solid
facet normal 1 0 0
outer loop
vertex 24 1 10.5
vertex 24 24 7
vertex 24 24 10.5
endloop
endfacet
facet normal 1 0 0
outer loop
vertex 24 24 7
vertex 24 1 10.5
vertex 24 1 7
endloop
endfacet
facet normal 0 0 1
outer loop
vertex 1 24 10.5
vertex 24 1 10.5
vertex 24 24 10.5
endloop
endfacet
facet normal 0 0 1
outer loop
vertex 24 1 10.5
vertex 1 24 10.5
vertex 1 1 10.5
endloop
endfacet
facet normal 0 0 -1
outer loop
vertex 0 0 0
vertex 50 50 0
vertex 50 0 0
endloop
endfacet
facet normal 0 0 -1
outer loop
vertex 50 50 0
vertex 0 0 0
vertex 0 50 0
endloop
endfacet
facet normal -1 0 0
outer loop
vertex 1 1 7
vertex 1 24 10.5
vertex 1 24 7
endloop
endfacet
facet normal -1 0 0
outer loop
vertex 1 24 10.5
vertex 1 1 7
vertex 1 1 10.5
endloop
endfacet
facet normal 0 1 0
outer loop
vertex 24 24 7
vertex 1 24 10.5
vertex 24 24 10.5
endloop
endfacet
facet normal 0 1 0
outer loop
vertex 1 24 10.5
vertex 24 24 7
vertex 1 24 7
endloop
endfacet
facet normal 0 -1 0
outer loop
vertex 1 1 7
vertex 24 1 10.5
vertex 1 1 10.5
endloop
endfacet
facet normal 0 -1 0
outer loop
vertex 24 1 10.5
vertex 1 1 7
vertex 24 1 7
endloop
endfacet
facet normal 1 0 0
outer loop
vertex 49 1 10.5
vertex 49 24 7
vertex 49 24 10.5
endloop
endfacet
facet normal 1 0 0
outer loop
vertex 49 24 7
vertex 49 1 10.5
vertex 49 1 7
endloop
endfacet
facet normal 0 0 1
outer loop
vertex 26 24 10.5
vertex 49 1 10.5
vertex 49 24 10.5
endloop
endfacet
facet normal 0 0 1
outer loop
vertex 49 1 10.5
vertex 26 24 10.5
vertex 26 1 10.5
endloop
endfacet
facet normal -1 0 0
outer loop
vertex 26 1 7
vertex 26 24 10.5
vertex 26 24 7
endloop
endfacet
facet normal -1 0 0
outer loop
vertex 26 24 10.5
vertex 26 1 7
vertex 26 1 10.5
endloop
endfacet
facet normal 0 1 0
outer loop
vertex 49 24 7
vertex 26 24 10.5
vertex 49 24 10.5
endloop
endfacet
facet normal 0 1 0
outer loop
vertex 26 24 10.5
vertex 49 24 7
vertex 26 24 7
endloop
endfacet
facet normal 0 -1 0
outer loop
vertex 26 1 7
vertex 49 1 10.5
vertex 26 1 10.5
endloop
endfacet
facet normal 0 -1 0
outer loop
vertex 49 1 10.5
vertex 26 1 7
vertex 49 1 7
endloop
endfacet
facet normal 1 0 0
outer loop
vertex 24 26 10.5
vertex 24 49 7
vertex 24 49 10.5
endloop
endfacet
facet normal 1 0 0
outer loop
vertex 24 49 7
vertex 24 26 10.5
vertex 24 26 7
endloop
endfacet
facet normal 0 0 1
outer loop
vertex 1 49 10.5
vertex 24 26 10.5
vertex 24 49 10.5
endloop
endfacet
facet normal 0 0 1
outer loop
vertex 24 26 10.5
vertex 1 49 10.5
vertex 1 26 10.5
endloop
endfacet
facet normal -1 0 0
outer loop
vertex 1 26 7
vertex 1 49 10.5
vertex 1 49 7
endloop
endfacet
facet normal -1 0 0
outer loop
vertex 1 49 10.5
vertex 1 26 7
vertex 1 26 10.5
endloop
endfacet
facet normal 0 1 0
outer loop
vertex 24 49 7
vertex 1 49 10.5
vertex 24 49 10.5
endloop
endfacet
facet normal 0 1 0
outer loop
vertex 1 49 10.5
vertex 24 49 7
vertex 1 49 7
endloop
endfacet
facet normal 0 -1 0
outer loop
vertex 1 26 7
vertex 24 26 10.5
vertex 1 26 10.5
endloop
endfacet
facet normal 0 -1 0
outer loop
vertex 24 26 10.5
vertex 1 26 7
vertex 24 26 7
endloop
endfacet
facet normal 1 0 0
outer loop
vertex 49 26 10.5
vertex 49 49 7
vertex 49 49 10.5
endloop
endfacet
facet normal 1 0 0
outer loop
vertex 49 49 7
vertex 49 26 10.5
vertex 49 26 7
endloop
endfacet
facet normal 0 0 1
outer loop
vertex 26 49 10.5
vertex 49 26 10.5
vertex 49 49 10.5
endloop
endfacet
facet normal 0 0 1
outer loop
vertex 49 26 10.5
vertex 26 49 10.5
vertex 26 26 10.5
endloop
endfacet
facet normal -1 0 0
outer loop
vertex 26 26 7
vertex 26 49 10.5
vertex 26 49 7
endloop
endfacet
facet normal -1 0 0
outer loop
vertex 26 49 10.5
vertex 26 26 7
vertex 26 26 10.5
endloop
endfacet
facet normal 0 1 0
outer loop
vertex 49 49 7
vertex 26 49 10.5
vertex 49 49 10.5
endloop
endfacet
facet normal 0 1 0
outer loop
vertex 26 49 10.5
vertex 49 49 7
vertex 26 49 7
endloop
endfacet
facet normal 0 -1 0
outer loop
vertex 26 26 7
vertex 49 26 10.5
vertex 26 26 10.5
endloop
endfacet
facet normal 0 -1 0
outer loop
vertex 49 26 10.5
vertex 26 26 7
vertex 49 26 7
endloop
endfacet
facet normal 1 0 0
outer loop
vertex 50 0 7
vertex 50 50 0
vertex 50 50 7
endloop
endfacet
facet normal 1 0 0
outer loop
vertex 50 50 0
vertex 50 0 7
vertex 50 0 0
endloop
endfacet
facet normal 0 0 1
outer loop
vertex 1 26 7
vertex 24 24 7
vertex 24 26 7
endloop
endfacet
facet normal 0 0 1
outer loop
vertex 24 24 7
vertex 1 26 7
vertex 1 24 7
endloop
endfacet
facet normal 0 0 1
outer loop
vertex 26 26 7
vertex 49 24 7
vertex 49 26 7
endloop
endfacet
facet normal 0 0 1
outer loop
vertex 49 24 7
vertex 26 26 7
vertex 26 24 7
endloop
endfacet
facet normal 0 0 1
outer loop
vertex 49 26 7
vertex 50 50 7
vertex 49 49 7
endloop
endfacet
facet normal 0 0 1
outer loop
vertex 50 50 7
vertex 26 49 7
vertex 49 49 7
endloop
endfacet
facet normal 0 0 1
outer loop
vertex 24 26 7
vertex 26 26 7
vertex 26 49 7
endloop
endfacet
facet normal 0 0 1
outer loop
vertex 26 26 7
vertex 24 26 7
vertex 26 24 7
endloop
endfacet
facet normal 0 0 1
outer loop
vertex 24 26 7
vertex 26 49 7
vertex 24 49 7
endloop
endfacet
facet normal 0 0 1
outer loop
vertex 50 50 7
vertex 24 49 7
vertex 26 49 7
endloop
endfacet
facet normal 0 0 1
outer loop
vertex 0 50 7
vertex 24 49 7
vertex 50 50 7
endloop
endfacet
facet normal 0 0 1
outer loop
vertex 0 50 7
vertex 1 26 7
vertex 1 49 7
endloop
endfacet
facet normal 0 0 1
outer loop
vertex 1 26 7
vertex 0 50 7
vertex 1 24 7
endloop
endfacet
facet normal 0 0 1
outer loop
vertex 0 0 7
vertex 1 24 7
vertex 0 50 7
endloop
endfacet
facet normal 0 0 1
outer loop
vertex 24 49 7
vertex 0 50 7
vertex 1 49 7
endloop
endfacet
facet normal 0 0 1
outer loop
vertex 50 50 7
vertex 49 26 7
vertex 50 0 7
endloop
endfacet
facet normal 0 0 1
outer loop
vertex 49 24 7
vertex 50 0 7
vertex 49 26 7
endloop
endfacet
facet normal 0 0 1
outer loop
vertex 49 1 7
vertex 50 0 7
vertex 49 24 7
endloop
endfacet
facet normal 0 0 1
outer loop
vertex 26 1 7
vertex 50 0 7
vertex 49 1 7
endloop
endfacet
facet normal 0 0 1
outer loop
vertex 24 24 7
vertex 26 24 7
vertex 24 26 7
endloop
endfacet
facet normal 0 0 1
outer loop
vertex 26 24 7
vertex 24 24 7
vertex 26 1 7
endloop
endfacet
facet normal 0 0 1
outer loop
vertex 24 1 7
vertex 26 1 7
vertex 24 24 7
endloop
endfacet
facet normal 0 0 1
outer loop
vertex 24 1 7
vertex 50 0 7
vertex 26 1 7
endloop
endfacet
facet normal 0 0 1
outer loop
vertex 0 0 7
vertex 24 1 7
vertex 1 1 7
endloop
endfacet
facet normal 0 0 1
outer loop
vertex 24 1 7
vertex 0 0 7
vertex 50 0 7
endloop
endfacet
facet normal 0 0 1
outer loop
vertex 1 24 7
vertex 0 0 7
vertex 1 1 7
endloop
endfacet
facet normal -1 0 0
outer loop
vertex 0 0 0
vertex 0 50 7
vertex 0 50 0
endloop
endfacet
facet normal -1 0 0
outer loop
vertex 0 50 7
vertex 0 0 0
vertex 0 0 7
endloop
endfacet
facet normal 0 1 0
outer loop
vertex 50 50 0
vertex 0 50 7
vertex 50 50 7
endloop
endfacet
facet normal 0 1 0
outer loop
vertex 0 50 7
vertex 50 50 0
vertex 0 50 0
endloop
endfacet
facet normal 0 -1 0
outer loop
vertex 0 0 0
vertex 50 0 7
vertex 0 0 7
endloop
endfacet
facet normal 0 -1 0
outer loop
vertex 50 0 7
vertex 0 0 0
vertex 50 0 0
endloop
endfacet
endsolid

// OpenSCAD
color("LightGray") {
    translate([1,1,0]) cube([23,23,6+4.5]);
    translate([25+1,1,0]) cube([23,23,6+4.5]);
    translate([1,25+1,0]) cube([23,23,6+4.5]);
    translate([25+1,25+1,0]) cube([23,23,6+4.5]);
}
color("Grey") {
    cube([50,50,7]);
//    translate([0,50-10.2,0]) cube([50,10.2,50]);
//    translate([50-10.2,0,0]) cube([10.2,50,50]);
}
